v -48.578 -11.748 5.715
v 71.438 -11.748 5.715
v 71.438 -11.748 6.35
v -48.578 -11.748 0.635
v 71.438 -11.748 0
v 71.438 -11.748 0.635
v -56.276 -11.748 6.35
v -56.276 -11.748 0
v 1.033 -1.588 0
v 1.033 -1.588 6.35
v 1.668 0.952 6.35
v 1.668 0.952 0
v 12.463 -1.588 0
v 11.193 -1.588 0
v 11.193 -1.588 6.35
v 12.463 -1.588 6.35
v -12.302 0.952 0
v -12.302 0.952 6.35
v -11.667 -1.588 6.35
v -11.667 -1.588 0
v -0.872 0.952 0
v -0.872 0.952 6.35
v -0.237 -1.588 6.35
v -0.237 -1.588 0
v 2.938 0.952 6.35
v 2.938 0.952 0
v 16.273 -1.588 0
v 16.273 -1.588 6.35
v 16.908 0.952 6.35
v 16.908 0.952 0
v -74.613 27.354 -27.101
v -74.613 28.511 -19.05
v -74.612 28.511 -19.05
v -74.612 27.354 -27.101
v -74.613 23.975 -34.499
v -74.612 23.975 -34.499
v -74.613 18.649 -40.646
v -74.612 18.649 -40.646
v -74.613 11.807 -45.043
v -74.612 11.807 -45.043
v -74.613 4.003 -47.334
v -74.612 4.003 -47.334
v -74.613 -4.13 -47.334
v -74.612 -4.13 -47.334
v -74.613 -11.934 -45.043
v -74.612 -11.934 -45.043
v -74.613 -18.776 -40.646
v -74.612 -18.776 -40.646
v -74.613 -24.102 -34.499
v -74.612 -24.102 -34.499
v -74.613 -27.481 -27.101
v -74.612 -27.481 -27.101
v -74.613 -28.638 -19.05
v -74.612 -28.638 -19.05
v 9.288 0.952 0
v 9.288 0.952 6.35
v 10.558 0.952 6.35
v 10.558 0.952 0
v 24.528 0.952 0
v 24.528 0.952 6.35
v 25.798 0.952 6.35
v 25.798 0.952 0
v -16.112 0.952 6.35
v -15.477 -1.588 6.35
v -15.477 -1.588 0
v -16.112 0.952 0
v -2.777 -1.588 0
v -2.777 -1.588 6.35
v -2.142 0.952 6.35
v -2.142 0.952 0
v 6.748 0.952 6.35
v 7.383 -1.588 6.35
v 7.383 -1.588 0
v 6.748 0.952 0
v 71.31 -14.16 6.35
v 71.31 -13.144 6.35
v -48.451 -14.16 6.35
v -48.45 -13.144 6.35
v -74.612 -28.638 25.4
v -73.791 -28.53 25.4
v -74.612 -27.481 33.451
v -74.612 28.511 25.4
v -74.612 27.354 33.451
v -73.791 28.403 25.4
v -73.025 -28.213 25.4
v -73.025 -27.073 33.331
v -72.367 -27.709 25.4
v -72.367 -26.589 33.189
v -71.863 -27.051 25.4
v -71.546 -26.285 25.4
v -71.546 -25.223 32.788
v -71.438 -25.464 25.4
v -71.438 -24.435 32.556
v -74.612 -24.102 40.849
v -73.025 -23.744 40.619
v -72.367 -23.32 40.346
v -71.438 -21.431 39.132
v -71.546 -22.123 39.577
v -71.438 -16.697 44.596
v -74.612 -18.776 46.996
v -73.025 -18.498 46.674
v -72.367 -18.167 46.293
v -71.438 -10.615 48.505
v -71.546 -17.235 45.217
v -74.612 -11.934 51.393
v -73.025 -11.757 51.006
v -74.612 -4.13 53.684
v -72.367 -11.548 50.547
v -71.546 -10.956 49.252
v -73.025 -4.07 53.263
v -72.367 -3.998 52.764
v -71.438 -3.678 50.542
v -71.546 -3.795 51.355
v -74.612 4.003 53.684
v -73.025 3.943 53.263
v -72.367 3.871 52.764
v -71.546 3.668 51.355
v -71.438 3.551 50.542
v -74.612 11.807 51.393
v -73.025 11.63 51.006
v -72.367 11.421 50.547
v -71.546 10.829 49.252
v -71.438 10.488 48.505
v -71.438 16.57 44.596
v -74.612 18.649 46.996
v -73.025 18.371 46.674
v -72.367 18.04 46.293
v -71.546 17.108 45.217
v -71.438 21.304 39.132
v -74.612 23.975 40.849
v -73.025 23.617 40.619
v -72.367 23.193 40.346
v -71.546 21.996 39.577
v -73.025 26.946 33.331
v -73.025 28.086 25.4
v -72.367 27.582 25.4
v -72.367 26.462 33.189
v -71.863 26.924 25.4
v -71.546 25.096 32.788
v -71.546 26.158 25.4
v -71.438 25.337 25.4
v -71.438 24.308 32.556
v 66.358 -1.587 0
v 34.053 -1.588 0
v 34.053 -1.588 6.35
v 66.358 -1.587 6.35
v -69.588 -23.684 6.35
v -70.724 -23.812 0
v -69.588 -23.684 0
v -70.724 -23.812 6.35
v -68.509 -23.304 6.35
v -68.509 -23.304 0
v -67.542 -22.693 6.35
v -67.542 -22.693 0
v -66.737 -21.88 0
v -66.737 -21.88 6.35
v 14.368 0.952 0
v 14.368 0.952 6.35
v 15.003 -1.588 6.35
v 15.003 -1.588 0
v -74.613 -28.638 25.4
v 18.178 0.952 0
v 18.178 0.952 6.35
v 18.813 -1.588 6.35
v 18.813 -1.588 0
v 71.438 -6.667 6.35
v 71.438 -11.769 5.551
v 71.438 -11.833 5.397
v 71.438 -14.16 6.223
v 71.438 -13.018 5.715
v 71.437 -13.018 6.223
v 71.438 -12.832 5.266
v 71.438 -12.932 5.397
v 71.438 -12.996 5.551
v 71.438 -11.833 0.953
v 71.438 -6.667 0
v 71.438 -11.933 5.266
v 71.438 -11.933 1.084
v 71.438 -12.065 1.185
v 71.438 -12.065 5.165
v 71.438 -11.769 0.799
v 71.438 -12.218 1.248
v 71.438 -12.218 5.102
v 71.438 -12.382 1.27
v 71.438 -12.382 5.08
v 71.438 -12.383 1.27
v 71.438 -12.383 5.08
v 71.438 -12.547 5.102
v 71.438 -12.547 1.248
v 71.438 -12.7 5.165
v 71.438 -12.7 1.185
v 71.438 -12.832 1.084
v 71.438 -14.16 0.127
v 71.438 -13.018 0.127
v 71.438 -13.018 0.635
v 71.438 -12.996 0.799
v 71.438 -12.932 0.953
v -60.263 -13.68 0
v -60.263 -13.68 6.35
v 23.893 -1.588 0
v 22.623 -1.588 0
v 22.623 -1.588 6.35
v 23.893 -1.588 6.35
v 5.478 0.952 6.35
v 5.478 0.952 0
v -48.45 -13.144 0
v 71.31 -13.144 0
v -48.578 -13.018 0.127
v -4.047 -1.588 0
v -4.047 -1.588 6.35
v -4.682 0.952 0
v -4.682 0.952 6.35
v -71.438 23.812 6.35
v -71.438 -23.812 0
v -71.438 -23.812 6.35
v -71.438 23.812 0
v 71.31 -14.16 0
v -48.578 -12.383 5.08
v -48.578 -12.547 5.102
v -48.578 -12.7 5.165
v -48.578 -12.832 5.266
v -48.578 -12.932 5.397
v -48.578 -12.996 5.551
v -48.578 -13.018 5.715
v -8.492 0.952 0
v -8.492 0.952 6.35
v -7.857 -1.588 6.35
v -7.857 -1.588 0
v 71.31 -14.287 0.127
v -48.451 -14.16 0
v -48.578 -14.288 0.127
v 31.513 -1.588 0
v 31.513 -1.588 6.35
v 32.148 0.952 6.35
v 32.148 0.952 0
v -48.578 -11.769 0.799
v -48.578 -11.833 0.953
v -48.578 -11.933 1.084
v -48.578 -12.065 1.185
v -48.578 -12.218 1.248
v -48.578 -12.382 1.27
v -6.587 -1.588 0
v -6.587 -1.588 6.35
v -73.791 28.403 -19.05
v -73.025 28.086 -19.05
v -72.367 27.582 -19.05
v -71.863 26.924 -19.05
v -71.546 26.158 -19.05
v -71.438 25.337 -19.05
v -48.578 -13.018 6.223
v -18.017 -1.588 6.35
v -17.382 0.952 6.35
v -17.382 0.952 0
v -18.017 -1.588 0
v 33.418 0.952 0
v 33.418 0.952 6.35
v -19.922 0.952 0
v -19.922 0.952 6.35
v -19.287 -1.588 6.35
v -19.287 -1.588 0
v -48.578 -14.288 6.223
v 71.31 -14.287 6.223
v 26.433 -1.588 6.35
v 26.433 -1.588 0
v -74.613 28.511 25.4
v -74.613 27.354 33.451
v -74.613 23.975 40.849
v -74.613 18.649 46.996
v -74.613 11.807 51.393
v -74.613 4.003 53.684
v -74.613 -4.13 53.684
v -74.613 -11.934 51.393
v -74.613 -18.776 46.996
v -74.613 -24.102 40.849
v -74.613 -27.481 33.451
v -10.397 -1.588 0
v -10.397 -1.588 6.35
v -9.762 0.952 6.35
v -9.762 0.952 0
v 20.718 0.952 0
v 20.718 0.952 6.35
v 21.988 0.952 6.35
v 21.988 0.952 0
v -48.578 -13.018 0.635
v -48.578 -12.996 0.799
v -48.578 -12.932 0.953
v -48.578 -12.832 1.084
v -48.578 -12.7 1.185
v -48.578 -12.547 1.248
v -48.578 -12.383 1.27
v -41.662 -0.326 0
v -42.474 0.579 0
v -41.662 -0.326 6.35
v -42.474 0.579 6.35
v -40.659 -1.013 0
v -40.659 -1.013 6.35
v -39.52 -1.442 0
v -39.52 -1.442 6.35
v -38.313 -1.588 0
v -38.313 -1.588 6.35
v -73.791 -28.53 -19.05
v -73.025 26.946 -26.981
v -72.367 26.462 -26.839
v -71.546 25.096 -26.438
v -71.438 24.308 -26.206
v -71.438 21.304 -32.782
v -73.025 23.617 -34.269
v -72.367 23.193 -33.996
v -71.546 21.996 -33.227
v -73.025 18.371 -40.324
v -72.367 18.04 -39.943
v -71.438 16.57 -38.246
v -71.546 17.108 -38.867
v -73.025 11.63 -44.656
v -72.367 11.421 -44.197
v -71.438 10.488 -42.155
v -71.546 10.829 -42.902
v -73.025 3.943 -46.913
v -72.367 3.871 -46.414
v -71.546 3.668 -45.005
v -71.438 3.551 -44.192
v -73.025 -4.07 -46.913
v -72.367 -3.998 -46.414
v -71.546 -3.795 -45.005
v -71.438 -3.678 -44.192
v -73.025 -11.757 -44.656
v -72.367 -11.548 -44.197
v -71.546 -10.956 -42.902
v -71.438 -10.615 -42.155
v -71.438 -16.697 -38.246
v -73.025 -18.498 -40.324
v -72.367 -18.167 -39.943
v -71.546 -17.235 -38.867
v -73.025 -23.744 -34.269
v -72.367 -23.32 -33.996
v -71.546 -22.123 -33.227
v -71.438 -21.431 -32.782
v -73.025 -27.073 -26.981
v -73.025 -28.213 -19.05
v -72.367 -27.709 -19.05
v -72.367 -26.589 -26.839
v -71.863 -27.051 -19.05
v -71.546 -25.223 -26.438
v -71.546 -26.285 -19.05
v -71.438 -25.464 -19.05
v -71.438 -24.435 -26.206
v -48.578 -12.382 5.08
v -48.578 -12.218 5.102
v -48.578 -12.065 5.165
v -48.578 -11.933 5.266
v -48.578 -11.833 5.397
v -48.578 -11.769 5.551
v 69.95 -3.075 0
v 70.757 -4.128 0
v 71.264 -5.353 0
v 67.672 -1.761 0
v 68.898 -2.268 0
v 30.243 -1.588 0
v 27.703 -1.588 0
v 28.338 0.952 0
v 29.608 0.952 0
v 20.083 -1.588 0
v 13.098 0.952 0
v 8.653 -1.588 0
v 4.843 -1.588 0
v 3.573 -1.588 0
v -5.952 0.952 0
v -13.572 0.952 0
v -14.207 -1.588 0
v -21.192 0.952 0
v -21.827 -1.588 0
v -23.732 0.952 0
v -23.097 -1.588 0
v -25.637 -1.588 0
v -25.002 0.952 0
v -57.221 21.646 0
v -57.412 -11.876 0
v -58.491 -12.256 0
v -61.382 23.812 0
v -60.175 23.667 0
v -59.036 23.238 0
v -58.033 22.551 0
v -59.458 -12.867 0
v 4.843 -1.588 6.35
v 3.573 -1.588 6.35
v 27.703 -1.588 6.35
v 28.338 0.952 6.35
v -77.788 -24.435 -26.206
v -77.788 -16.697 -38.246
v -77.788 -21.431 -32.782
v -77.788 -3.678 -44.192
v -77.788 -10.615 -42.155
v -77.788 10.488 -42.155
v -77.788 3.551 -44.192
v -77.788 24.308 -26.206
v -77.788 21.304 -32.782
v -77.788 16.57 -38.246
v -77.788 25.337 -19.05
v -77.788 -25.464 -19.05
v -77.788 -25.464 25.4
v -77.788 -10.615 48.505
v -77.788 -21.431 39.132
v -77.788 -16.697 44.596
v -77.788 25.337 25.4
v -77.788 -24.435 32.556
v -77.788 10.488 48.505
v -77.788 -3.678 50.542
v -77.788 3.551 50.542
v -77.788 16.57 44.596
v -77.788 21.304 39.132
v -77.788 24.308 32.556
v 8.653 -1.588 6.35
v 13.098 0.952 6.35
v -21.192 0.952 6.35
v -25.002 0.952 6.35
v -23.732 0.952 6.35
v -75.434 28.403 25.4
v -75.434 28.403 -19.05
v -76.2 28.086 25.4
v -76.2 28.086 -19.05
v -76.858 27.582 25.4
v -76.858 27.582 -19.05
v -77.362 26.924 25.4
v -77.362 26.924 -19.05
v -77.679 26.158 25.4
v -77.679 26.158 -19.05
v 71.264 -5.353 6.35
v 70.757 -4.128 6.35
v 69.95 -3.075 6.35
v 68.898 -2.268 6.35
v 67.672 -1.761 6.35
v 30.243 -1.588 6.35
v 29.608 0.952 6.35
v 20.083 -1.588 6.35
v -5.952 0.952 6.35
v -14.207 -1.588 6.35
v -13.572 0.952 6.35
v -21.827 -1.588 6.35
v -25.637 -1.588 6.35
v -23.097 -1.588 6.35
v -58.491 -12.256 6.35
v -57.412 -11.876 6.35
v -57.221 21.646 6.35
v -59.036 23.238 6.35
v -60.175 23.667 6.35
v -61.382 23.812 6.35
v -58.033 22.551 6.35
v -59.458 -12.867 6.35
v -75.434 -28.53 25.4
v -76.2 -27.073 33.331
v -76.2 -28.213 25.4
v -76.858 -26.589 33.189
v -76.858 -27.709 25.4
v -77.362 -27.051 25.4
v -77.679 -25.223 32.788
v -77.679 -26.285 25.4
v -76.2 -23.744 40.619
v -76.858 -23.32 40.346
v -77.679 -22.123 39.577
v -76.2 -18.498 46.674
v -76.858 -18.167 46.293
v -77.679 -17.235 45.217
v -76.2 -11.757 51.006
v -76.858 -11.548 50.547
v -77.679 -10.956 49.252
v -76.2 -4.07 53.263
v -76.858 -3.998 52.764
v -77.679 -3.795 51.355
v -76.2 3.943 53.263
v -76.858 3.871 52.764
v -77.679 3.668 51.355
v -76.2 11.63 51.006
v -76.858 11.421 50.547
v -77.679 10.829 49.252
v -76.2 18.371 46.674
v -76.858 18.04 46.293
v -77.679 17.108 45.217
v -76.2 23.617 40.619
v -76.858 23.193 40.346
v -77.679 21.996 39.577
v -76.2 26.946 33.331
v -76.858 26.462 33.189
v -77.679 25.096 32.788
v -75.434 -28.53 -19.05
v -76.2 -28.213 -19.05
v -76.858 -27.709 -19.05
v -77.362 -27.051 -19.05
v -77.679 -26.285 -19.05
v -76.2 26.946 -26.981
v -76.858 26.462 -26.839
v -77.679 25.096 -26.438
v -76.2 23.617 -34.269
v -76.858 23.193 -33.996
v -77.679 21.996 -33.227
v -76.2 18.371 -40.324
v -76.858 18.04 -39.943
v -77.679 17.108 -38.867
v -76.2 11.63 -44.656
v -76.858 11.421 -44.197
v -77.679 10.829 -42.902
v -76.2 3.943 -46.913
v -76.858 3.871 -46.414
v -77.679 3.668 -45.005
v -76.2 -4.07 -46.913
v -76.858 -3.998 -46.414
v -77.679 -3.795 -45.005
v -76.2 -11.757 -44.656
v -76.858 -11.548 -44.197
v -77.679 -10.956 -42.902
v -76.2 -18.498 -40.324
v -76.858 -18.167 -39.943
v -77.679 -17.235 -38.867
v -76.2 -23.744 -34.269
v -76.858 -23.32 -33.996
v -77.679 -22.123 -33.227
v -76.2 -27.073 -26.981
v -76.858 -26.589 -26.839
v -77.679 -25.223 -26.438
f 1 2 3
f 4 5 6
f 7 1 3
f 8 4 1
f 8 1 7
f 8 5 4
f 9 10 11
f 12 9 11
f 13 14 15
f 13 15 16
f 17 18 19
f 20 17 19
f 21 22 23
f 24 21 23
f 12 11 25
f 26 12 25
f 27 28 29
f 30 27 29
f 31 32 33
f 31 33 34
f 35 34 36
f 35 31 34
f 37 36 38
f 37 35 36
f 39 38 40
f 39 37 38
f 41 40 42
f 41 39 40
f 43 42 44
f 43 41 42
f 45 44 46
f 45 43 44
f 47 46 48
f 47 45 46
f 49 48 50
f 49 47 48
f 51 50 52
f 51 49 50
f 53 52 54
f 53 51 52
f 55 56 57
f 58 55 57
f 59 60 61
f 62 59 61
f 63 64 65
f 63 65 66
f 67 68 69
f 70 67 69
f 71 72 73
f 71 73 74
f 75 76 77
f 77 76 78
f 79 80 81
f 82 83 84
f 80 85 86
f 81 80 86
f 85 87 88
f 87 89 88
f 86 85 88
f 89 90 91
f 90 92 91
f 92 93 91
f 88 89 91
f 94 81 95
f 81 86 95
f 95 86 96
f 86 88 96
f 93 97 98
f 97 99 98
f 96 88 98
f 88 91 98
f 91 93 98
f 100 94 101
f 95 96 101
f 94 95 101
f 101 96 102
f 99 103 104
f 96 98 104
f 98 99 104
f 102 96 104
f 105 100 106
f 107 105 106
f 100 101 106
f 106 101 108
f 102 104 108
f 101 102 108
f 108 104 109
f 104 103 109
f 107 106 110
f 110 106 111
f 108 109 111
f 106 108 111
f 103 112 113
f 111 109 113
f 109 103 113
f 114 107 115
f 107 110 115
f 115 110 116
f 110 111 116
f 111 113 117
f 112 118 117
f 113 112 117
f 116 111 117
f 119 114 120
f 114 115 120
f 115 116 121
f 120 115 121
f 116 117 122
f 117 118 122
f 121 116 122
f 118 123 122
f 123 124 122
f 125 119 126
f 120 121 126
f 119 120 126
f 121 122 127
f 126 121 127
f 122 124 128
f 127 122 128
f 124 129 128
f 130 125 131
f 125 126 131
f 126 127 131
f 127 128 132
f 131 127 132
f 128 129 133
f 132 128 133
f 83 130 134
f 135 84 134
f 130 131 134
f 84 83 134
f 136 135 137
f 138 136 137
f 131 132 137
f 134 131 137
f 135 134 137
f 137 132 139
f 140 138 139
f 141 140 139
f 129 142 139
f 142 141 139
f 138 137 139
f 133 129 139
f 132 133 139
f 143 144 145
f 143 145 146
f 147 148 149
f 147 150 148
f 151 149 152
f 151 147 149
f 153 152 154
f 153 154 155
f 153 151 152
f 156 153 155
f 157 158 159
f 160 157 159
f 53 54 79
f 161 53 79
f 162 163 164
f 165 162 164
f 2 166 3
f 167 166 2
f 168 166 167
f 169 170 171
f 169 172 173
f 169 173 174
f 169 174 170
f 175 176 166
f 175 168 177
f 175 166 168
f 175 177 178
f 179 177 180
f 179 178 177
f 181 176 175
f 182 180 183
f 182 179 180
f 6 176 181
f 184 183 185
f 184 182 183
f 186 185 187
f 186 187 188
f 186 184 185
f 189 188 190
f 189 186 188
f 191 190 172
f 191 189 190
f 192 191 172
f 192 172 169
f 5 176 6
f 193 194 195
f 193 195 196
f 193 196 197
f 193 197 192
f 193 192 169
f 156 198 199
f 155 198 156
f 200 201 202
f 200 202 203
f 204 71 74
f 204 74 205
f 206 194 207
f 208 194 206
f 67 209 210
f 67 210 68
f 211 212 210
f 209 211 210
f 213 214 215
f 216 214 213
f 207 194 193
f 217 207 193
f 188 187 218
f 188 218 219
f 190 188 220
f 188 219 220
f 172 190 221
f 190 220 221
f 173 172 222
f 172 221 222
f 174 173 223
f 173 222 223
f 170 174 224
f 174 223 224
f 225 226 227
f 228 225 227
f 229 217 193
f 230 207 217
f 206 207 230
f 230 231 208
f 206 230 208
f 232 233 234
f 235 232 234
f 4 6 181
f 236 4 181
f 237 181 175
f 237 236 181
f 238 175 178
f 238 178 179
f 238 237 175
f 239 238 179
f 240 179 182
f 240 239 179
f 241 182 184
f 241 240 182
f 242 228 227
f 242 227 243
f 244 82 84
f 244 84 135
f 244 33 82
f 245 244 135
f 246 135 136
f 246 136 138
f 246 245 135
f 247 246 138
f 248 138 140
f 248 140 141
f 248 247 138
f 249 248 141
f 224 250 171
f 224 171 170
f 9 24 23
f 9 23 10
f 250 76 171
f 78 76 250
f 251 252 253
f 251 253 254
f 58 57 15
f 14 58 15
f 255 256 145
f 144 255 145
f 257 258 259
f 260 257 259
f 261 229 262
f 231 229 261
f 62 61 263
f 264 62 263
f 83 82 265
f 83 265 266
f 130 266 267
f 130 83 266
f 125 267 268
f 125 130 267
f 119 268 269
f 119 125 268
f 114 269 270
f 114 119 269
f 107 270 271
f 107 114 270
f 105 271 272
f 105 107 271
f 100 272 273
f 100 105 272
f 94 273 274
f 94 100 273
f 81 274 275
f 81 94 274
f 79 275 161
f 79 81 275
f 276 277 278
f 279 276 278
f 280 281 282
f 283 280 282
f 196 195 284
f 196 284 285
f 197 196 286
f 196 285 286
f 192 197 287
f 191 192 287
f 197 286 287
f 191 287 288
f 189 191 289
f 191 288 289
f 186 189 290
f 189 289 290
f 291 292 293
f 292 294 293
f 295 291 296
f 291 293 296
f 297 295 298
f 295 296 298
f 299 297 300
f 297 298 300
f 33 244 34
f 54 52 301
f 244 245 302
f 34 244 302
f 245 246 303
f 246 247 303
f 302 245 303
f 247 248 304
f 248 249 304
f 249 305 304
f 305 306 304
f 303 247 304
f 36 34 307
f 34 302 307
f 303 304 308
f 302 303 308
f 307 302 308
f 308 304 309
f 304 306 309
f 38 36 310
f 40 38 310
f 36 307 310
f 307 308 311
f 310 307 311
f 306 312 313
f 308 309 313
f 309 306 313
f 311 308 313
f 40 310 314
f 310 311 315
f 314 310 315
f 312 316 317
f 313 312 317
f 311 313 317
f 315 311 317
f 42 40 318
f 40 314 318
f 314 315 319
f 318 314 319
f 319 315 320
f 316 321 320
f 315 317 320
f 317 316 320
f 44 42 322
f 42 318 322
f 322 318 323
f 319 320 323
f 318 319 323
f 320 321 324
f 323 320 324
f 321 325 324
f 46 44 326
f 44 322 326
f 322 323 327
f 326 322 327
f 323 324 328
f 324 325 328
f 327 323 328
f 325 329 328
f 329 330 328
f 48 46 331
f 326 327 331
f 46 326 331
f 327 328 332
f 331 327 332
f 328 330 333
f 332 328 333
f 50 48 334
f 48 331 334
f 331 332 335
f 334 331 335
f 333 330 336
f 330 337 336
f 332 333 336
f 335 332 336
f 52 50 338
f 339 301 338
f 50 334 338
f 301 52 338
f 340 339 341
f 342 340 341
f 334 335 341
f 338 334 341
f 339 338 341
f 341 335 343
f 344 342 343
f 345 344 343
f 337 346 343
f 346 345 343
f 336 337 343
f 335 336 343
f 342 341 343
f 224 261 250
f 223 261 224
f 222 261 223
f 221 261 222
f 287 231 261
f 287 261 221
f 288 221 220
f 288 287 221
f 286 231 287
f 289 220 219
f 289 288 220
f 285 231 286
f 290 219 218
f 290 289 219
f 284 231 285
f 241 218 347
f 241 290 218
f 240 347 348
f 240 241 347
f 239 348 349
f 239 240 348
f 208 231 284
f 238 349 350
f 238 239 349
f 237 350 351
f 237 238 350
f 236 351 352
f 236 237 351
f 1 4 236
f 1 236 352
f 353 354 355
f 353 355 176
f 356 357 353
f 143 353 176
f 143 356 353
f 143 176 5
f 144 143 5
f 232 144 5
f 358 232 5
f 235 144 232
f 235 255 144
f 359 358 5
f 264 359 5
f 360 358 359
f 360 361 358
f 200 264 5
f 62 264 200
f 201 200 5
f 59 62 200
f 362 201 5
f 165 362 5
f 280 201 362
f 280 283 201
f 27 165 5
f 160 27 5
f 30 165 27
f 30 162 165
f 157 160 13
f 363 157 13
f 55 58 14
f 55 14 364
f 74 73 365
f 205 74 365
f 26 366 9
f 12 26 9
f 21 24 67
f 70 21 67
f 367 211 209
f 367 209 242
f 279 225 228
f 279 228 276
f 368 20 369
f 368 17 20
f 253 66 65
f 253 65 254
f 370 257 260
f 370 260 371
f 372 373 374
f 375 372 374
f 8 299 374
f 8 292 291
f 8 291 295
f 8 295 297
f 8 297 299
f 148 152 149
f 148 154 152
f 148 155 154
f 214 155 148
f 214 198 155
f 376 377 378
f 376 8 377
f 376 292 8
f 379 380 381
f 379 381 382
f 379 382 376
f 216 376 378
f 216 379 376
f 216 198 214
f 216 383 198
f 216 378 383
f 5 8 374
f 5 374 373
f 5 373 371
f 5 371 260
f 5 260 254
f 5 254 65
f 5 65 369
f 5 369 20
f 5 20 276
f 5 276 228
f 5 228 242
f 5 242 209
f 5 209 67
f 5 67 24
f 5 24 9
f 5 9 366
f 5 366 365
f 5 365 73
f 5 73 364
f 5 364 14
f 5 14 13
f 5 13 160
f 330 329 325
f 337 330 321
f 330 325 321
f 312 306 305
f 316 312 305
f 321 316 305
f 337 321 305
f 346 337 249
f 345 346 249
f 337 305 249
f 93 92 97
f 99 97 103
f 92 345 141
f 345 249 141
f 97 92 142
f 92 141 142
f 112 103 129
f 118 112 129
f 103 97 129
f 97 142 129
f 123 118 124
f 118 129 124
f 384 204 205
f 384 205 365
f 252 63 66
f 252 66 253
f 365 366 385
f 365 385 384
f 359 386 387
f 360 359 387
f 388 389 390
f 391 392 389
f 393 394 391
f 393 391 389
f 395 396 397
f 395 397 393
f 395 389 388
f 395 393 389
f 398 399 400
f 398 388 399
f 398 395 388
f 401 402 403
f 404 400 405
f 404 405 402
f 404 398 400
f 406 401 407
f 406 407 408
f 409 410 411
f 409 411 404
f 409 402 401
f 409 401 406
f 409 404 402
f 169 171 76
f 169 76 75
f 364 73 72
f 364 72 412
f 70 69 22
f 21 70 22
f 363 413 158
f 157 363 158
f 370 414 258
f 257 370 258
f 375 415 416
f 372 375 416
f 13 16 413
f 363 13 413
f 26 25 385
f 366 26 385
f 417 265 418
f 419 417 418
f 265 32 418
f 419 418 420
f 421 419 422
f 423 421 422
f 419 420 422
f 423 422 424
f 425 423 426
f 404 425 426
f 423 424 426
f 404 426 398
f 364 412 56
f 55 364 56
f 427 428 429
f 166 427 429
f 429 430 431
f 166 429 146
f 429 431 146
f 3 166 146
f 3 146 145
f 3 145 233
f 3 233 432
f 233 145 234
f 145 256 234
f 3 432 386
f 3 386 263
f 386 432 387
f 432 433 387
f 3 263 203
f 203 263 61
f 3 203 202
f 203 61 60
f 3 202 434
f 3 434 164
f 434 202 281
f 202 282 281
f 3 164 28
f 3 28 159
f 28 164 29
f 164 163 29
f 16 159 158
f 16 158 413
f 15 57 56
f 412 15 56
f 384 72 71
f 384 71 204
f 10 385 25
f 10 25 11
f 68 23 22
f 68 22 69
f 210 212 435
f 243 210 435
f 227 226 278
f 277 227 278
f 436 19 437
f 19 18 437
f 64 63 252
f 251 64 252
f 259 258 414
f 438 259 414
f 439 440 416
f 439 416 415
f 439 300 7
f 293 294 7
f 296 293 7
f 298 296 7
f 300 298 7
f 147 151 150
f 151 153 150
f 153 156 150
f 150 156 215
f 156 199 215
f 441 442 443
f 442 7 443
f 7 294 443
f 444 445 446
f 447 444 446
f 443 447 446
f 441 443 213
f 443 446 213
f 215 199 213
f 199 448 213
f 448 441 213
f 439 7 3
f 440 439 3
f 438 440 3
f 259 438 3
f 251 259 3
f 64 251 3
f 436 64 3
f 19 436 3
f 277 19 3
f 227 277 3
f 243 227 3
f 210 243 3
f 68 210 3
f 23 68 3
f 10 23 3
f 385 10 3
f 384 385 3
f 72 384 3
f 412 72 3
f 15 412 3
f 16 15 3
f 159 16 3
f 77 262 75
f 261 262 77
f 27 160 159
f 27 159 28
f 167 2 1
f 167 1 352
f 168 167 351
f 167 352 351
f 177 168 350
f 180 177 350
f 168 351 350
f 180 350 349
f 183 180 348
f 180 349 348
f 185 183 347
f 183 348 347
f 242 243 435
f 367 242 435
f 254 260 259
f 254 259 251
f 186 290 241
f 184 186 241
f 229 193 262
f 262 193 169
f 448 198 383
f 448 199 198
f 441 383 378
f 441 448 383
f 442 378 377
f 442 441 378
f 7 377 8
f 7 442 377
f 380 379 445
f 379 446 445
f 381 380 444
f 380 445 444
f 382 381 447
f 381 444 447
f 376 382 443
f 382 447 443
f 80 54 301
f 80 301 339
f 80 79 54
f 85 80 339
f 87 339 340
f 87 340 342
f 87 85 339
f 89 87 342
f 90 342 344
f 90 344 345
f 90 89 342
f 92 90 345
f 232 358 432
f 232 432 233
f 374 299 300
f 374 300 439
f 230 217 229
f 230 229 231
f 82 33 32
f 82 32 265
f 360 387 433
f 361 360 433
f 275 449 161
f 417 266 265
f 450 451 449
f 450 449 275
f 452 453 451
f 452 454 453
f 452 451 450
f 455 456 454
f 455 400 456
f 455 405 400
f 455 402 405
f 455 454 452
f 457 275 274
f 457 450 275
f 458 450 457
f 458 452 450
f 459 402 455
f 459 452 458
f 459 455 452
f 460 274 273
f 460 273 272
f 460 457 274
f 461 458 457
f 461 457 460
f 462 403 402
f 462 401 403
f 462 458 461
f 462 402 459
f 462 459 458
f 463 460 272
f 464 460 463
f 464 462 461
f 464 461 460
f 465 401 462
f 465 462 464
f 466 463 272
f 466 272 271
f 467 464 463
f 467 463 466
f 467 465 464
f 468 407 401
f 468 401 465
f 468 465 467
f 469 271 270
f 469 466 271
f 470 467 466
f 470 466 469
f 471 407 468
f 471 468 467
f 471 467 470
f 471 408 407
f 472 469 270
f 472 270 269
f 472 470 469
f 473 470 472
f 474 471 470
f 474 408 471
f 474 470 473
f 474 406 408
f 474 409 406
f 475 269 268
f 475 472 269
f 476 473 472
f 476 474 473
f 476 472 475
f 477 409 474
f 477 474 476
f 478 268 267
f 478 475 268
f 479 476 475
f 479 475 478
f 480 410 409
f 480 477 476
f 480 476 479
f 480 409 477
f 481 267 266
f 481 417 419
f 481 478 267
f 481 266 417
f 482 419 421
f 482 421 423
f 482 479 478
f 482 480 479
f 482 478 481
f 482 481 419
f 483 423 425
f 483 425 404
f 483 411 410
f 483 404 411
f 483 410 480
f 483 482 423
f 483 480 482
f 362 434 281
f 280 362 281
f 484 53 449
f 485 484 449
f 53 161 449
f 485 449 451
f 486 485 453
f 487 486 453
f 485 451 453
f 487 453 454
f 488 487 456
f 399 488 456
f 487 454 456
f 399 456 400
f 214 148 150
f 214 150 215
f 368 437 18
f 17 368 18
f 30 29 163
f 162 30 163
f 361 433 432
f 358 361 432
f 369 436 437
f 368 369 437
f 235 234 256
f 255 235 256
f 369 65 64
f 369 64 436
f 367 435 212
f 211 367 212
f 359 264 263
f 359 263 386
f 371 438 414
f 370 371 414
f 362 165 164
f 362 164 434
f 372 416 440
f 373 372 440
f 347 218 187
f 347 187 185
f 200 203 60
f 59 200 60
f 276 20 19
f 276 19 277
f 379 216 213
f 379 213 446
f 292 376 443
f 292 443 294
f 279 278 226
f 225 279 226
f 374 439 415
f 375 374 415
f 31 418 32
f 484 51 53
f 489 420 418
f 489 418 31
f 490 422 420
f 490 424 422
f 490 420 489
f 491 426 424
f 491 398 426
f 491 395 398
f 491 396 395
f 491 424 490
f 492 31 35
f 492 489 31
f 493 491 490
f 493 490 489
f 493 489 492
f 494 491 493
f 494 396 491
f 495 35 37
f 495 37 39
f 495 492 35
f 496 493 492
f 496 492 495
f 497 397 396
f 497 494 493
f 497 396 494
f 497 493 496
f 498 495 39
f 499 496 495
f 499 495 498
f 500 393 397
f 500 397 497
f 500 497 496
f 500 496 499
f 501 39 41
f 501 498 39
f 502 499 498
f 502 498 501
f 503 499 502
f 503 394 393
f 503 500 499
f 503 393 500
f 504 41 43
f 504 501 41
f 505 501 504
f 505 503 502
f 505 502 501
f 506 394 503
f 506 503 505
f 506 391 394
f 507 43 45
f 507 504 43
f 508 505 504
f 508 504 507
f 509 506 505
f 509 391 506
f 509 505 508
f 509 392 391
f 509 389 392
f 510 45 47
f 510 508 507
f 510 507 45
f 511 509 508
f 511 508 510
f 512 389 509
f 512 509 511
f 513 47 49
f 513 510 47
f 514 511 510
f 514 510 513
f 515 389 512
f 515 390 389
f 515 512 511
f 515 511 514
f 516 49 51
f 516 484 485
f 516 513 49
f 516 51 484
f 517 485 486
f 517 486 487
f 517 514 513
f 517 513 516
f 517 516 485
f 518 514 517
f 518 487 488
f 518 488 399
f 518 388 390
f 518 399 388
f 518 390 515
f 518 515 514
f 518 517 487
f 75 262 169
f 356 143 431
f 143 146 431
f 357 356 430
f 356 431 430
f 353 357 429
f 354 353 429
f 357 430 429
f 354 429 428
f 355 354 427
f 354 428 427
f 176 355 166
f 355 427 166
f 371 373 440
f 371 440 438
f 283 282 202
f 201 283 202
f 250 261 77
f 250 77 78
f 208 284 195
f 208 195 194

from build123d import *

# Parameters (mm, degrees)
BOSS_EXTRUDE1_DEPTH = 6.35
FILLET1_R           = 5.08
FILLET2_R           = 5.08
FILLET3_R           = 5.08
SKETCH2_W           = 1.27
SKETCH2_H           = 1.27
CUT_EXTRUDE1_DEPTH  = 120.015
FILLET5_R           = 0.635
FILLET6_R           = 0.635
CHAMFER1_SIZE       = 0.127
BOSS_EXTRUDE2_DEPTH = 6.35
SKETCH4_W           = 101.6
SKETCH4_H           = 57.15
BOSS_EXTRUDE3_DEPTH = 6.35
FILLET7_RADIUS      = 28.575
FILLET7_LENGTH      = 6.35
FILLET8_RADIUS      = 28.575
FILLET8_LENGTH      = 6.35
FILLET9_R           = 3.175


with BuildPart() as part:
    # Sketch1 → Boss-Extrude1 (new body)
    with BuildSketch(Plane.XY):
        Polygon((-71.4375, 23.8125), (-58.7375, 23.8125), (-40.9575, -1.5875), (71.4375, -1.5875), (71.4375, -14.2875), (-48.5775, -14.2875), (-48.5775, -11.7475), (-58.7375, -11.7475), (-68.2625, -23.8125), (-71.4375, -23.8125), align=None)
    extrude(amount=BOSS_EXTRUDE1_DEPTH)

    # Fillet1
    fillet1_edges = [part.edges().sort_by_distance(p)[0] for p in [
        (-58.7375, 23.8125, 3.175),
    ]]
    fillet(fillet1_edges, radius=FILLET1_R)

    # Fillet2
    fillet2_edges = [part.edges().sort_by_distance(p)[0] for p in [
        (-40.9575, -1.5875, 3.175),
        (-58.7375, -11.7475, 3.175),
        (-68.2625, -23.8125, 3.175),
    ]]
    fillet(fillet2_edges, radius=FILLET2_R)

    # Fillet3
    fillet3_edges = [part.edges().sort_by_distance(p)[0] for p in [
        (71.4375, -1.5875, 3.175),
    ]]
    fillet(fillet3_edges, radius=FILLET3_R)

    # Sketch2 → Cut-Extrude1 (cut)
    with BuildSketch(Plane(origin=(71.4375, 0, 0), x_dir=(0, 0, -1), z_dir=(1, 0, 0))):
        with Locations((-5.715, -12.3825)):
            Rectangle(SKETCH2_W, SKETCH2_H)
        with Locations((-0.635, -12.3825)):
            Rectangle(SKETCH2_W, SKETCH2_H)
    extrude(amount=-CUT_EXTRUDE1_DEPTH, mode=Mode.SUBTRACT)

    # Fillet5
    fillet5_edges = [part.edges().sort_by_distance(p)[0] for p in [
        (11.43, -11.7475, 1.27),
        (11.43, -13.0175, 1.27),
    ]]
    fillet(fillet5_edges, radius=FILLET5_R - 0.0001)  # a hair under: the kernel refuses the full size

    # Fillet6
    fillet6_edges = [part.edges().sort_by_distance(p)[0] for p in [
        (11.43, -11.7475, 5.08),
        (11.43, -13.0175, 5.08),
    ]]
    fillet(fillet6_edges, radius=FILLET6_R - 0.0001)  # a hair under: the kernel refuses the full size

    # Chamfer1
    chamfer1_edges = [part.edges().sort_by_distance(p)[0] for p in [
        (71.4375, -13.6525, 0),
        (11.43, -14.2875, 0),
        (71.4375, -14.2875, 3.175),
        (11.43, -14.2875, 6.35),
        (71.4375, -13.6525, 6.35),
        (-48.5775, -13.6525, 0),
        (-48.5775, -13.6525, 6.35),
        (11.43, -13.0175, 6.35),
        (11.43, -13.0175, 0),
    ]]
    chamfer(chamfer1_edges, length=CHAMFER1_SIZE)

    # Sketch3 → Boss-Extrude2 (add)
    with BuildSketch(Plane.XY.offset(6.35)):
        Polygon((-18.01675216, -1.5875), (-15.47675216, -1.5875), (-16.11175216, 0.9525), (-17.38175216, 0.9525), align=None)
        Polygon((5.47824784, 0.9525), (4.84324784, -1.5875), (7.38324784, -1.5875), (6.74824784, 0.9525), align=None)
        Polygon((-25.63675216, -1.5875), (-25.00175216, 0.9525), (-23.73175216, 0.9525), (-23.09675216, -1.5875), align=None)
        Polygon((-21.82675216, -1.5875), (-21.19175216, 0.9525), (-19.92175216, 0.9525), (-19.28675216, -1.5875), align=None)
        Polygon((-12.30175216, 0.9525), (-11.66675216, -1.5875), (-14.20675216, -1.5875), (-13.57175216, 0.9525), align=None)
        Polygon((-8.49175216, 0.9525), (-7.85675216, -1.5875), (-10.39675216, -1.5875), (-9.76175216, 0.9525), align=None)
        Polygon((-4.68175216, 0.9525), (-4.04675216, -1.5875), (-6.58675216, -1.5875), (-5.95175216, 0.9525), align=None)
        Polygon((-2.77675216, -1.5875), (-2.14175216, 0.9525), (-0.87175216, 0.9525), (-0.23675216, -1.5875), align=None)
        Polygon((2.93824784, 0.9525), (3.57324784, -1.5875), (1.03324784, -1.5875), (1.66824784, 0.9525), align=None)
        Polygon((10.55824784, 0.9525), (11.19324784, -1.5875), (8.65324784, -1.5875), (9.28824784, 0.9525), align=None)
        Polygon((14.36824784, 0.9525), (15.00324784, -1.5875), (12.46324784, -1.5875), (13.09824784, 0.9525), align=None)
        Polygon((18.17824784, 0.9525), (18.81324784, -1.5875), (16.27324784, -1.5875), (16.90824784, 0.9525), align=None)
        Polygon((21.98824784, 0.9525), (22.62324784, -1.5875), (20.08324784, -1.5875), (20.71824784, 0.9525), align=None)
        Polygon((25.79824784, 0.9525), (26.43324784, -1.5875), (23.89324784, -1.5875), (24.52824784, 0.9525), align=None)
        Polygon((27.70324784, -1.5875), (28.33824784, 0.9525), (29.60824784, 0.9525), (30.24324784, -1.5875), align=None)
        Polygon((33.41824784, 0.9525), (34.05324784, -1.5875), (31.51324784, -1.5875), (32.14824784, 0.9525), align=None)
    extrude(amount=-BOSS_EXTRUDE2_DEPTH)


with BuildPart() as body_2:
    # Sketch4 → Boss-Extrude3 (new body)
    with BuildSketch(Plane.ZY.offset(71.4375)):
        with Locations((3.175, -0.0635)):
            Rectangle(SKETCH4_W, SKETCH4_H)
    extrude(amount=BOSS_EXTRUDE3_DEPTH)

    # Fillet7: full round fillet: the end face becomes a half cylinder, R = half its width
    fillet7_face = Plane((-74.6125, -0.0635, -47.625), x_dir=(-1, 0, 0), z_dir=(0, 0, -1))  # on the end face: x along it, z out of the body
    fillet7_slab = fillet7_face.offset(-FILLET7_RADIUS / 2) * Box(FILLET7_LENGTH, 2 * FILLET7_RADIUS, FILLET7_RADIUS, mode=Mode.PRIVATE)  # the body's end, R deep
    fillet7_round = Plane((-74.6125, -0.0635, -19.05), x_dir=(0, 0, -1), z_dir=(-1, 0, 0)) * Cylinder(FILLET7_RADIUS, FILLET7_LENGTH, mode=Mode.PRIVATE)  # its axis R under the face
    add(fillet7_slab - fillet7_round, mode=Mode.SUBTRACT)

    # Fillet8: full round fillet: the end face becomes a half cylinder, R = half its width
    fillet8_face = Plane((-74.6125, -0.0635, 53.975), x_dir=(1, 0, 0), z_dir=(0, 0, 1))  # on the end face: x along it, z out of the body
    fillet8_slab = fillet8_face.offset(-FILLET8_RADIUS / 2) * Box(FILLET8_LENGTH, 2 * FILLET8_RADIUS, FILLET8_RADIUS, mode=Mode.PRIVATE)  # the body's end, R deep
    fillet8_round = Plane((-74.6125, -0.0635, 25.4), x_dir=(0, 0, 1), z_dir=(1, 0, 0)) * Cylinder(FILLET8_RADIUS, FILLET8_LENGTH, mode=Mode.PRIVATE)  # its axis R under the face
    add(fillet8_slab - fillet8_round, mode=Mode.SUBTRACT)

    # Fillet9
    fillet9_edges = [body_2.edges().sort_by_distance(p)[0] for p in [
        (-71.4375, -28.6385, 3.175),
        (-77.7875, -28.6385, 3.175),
        (-71.4375, -0.0635, -47.625),
        (-71.4375, 28.5115, 3.175),
        (-77.7875, 28.5115, 3.175),
        (-77.7875, -0.0635, 53.975),
    ]]
    fillet(fillet9_edges, radius=FILLET9_R - 0.0001)  # a hair under: the kernel refuses the full size


solid = Compound([part.part, body_2.part])
